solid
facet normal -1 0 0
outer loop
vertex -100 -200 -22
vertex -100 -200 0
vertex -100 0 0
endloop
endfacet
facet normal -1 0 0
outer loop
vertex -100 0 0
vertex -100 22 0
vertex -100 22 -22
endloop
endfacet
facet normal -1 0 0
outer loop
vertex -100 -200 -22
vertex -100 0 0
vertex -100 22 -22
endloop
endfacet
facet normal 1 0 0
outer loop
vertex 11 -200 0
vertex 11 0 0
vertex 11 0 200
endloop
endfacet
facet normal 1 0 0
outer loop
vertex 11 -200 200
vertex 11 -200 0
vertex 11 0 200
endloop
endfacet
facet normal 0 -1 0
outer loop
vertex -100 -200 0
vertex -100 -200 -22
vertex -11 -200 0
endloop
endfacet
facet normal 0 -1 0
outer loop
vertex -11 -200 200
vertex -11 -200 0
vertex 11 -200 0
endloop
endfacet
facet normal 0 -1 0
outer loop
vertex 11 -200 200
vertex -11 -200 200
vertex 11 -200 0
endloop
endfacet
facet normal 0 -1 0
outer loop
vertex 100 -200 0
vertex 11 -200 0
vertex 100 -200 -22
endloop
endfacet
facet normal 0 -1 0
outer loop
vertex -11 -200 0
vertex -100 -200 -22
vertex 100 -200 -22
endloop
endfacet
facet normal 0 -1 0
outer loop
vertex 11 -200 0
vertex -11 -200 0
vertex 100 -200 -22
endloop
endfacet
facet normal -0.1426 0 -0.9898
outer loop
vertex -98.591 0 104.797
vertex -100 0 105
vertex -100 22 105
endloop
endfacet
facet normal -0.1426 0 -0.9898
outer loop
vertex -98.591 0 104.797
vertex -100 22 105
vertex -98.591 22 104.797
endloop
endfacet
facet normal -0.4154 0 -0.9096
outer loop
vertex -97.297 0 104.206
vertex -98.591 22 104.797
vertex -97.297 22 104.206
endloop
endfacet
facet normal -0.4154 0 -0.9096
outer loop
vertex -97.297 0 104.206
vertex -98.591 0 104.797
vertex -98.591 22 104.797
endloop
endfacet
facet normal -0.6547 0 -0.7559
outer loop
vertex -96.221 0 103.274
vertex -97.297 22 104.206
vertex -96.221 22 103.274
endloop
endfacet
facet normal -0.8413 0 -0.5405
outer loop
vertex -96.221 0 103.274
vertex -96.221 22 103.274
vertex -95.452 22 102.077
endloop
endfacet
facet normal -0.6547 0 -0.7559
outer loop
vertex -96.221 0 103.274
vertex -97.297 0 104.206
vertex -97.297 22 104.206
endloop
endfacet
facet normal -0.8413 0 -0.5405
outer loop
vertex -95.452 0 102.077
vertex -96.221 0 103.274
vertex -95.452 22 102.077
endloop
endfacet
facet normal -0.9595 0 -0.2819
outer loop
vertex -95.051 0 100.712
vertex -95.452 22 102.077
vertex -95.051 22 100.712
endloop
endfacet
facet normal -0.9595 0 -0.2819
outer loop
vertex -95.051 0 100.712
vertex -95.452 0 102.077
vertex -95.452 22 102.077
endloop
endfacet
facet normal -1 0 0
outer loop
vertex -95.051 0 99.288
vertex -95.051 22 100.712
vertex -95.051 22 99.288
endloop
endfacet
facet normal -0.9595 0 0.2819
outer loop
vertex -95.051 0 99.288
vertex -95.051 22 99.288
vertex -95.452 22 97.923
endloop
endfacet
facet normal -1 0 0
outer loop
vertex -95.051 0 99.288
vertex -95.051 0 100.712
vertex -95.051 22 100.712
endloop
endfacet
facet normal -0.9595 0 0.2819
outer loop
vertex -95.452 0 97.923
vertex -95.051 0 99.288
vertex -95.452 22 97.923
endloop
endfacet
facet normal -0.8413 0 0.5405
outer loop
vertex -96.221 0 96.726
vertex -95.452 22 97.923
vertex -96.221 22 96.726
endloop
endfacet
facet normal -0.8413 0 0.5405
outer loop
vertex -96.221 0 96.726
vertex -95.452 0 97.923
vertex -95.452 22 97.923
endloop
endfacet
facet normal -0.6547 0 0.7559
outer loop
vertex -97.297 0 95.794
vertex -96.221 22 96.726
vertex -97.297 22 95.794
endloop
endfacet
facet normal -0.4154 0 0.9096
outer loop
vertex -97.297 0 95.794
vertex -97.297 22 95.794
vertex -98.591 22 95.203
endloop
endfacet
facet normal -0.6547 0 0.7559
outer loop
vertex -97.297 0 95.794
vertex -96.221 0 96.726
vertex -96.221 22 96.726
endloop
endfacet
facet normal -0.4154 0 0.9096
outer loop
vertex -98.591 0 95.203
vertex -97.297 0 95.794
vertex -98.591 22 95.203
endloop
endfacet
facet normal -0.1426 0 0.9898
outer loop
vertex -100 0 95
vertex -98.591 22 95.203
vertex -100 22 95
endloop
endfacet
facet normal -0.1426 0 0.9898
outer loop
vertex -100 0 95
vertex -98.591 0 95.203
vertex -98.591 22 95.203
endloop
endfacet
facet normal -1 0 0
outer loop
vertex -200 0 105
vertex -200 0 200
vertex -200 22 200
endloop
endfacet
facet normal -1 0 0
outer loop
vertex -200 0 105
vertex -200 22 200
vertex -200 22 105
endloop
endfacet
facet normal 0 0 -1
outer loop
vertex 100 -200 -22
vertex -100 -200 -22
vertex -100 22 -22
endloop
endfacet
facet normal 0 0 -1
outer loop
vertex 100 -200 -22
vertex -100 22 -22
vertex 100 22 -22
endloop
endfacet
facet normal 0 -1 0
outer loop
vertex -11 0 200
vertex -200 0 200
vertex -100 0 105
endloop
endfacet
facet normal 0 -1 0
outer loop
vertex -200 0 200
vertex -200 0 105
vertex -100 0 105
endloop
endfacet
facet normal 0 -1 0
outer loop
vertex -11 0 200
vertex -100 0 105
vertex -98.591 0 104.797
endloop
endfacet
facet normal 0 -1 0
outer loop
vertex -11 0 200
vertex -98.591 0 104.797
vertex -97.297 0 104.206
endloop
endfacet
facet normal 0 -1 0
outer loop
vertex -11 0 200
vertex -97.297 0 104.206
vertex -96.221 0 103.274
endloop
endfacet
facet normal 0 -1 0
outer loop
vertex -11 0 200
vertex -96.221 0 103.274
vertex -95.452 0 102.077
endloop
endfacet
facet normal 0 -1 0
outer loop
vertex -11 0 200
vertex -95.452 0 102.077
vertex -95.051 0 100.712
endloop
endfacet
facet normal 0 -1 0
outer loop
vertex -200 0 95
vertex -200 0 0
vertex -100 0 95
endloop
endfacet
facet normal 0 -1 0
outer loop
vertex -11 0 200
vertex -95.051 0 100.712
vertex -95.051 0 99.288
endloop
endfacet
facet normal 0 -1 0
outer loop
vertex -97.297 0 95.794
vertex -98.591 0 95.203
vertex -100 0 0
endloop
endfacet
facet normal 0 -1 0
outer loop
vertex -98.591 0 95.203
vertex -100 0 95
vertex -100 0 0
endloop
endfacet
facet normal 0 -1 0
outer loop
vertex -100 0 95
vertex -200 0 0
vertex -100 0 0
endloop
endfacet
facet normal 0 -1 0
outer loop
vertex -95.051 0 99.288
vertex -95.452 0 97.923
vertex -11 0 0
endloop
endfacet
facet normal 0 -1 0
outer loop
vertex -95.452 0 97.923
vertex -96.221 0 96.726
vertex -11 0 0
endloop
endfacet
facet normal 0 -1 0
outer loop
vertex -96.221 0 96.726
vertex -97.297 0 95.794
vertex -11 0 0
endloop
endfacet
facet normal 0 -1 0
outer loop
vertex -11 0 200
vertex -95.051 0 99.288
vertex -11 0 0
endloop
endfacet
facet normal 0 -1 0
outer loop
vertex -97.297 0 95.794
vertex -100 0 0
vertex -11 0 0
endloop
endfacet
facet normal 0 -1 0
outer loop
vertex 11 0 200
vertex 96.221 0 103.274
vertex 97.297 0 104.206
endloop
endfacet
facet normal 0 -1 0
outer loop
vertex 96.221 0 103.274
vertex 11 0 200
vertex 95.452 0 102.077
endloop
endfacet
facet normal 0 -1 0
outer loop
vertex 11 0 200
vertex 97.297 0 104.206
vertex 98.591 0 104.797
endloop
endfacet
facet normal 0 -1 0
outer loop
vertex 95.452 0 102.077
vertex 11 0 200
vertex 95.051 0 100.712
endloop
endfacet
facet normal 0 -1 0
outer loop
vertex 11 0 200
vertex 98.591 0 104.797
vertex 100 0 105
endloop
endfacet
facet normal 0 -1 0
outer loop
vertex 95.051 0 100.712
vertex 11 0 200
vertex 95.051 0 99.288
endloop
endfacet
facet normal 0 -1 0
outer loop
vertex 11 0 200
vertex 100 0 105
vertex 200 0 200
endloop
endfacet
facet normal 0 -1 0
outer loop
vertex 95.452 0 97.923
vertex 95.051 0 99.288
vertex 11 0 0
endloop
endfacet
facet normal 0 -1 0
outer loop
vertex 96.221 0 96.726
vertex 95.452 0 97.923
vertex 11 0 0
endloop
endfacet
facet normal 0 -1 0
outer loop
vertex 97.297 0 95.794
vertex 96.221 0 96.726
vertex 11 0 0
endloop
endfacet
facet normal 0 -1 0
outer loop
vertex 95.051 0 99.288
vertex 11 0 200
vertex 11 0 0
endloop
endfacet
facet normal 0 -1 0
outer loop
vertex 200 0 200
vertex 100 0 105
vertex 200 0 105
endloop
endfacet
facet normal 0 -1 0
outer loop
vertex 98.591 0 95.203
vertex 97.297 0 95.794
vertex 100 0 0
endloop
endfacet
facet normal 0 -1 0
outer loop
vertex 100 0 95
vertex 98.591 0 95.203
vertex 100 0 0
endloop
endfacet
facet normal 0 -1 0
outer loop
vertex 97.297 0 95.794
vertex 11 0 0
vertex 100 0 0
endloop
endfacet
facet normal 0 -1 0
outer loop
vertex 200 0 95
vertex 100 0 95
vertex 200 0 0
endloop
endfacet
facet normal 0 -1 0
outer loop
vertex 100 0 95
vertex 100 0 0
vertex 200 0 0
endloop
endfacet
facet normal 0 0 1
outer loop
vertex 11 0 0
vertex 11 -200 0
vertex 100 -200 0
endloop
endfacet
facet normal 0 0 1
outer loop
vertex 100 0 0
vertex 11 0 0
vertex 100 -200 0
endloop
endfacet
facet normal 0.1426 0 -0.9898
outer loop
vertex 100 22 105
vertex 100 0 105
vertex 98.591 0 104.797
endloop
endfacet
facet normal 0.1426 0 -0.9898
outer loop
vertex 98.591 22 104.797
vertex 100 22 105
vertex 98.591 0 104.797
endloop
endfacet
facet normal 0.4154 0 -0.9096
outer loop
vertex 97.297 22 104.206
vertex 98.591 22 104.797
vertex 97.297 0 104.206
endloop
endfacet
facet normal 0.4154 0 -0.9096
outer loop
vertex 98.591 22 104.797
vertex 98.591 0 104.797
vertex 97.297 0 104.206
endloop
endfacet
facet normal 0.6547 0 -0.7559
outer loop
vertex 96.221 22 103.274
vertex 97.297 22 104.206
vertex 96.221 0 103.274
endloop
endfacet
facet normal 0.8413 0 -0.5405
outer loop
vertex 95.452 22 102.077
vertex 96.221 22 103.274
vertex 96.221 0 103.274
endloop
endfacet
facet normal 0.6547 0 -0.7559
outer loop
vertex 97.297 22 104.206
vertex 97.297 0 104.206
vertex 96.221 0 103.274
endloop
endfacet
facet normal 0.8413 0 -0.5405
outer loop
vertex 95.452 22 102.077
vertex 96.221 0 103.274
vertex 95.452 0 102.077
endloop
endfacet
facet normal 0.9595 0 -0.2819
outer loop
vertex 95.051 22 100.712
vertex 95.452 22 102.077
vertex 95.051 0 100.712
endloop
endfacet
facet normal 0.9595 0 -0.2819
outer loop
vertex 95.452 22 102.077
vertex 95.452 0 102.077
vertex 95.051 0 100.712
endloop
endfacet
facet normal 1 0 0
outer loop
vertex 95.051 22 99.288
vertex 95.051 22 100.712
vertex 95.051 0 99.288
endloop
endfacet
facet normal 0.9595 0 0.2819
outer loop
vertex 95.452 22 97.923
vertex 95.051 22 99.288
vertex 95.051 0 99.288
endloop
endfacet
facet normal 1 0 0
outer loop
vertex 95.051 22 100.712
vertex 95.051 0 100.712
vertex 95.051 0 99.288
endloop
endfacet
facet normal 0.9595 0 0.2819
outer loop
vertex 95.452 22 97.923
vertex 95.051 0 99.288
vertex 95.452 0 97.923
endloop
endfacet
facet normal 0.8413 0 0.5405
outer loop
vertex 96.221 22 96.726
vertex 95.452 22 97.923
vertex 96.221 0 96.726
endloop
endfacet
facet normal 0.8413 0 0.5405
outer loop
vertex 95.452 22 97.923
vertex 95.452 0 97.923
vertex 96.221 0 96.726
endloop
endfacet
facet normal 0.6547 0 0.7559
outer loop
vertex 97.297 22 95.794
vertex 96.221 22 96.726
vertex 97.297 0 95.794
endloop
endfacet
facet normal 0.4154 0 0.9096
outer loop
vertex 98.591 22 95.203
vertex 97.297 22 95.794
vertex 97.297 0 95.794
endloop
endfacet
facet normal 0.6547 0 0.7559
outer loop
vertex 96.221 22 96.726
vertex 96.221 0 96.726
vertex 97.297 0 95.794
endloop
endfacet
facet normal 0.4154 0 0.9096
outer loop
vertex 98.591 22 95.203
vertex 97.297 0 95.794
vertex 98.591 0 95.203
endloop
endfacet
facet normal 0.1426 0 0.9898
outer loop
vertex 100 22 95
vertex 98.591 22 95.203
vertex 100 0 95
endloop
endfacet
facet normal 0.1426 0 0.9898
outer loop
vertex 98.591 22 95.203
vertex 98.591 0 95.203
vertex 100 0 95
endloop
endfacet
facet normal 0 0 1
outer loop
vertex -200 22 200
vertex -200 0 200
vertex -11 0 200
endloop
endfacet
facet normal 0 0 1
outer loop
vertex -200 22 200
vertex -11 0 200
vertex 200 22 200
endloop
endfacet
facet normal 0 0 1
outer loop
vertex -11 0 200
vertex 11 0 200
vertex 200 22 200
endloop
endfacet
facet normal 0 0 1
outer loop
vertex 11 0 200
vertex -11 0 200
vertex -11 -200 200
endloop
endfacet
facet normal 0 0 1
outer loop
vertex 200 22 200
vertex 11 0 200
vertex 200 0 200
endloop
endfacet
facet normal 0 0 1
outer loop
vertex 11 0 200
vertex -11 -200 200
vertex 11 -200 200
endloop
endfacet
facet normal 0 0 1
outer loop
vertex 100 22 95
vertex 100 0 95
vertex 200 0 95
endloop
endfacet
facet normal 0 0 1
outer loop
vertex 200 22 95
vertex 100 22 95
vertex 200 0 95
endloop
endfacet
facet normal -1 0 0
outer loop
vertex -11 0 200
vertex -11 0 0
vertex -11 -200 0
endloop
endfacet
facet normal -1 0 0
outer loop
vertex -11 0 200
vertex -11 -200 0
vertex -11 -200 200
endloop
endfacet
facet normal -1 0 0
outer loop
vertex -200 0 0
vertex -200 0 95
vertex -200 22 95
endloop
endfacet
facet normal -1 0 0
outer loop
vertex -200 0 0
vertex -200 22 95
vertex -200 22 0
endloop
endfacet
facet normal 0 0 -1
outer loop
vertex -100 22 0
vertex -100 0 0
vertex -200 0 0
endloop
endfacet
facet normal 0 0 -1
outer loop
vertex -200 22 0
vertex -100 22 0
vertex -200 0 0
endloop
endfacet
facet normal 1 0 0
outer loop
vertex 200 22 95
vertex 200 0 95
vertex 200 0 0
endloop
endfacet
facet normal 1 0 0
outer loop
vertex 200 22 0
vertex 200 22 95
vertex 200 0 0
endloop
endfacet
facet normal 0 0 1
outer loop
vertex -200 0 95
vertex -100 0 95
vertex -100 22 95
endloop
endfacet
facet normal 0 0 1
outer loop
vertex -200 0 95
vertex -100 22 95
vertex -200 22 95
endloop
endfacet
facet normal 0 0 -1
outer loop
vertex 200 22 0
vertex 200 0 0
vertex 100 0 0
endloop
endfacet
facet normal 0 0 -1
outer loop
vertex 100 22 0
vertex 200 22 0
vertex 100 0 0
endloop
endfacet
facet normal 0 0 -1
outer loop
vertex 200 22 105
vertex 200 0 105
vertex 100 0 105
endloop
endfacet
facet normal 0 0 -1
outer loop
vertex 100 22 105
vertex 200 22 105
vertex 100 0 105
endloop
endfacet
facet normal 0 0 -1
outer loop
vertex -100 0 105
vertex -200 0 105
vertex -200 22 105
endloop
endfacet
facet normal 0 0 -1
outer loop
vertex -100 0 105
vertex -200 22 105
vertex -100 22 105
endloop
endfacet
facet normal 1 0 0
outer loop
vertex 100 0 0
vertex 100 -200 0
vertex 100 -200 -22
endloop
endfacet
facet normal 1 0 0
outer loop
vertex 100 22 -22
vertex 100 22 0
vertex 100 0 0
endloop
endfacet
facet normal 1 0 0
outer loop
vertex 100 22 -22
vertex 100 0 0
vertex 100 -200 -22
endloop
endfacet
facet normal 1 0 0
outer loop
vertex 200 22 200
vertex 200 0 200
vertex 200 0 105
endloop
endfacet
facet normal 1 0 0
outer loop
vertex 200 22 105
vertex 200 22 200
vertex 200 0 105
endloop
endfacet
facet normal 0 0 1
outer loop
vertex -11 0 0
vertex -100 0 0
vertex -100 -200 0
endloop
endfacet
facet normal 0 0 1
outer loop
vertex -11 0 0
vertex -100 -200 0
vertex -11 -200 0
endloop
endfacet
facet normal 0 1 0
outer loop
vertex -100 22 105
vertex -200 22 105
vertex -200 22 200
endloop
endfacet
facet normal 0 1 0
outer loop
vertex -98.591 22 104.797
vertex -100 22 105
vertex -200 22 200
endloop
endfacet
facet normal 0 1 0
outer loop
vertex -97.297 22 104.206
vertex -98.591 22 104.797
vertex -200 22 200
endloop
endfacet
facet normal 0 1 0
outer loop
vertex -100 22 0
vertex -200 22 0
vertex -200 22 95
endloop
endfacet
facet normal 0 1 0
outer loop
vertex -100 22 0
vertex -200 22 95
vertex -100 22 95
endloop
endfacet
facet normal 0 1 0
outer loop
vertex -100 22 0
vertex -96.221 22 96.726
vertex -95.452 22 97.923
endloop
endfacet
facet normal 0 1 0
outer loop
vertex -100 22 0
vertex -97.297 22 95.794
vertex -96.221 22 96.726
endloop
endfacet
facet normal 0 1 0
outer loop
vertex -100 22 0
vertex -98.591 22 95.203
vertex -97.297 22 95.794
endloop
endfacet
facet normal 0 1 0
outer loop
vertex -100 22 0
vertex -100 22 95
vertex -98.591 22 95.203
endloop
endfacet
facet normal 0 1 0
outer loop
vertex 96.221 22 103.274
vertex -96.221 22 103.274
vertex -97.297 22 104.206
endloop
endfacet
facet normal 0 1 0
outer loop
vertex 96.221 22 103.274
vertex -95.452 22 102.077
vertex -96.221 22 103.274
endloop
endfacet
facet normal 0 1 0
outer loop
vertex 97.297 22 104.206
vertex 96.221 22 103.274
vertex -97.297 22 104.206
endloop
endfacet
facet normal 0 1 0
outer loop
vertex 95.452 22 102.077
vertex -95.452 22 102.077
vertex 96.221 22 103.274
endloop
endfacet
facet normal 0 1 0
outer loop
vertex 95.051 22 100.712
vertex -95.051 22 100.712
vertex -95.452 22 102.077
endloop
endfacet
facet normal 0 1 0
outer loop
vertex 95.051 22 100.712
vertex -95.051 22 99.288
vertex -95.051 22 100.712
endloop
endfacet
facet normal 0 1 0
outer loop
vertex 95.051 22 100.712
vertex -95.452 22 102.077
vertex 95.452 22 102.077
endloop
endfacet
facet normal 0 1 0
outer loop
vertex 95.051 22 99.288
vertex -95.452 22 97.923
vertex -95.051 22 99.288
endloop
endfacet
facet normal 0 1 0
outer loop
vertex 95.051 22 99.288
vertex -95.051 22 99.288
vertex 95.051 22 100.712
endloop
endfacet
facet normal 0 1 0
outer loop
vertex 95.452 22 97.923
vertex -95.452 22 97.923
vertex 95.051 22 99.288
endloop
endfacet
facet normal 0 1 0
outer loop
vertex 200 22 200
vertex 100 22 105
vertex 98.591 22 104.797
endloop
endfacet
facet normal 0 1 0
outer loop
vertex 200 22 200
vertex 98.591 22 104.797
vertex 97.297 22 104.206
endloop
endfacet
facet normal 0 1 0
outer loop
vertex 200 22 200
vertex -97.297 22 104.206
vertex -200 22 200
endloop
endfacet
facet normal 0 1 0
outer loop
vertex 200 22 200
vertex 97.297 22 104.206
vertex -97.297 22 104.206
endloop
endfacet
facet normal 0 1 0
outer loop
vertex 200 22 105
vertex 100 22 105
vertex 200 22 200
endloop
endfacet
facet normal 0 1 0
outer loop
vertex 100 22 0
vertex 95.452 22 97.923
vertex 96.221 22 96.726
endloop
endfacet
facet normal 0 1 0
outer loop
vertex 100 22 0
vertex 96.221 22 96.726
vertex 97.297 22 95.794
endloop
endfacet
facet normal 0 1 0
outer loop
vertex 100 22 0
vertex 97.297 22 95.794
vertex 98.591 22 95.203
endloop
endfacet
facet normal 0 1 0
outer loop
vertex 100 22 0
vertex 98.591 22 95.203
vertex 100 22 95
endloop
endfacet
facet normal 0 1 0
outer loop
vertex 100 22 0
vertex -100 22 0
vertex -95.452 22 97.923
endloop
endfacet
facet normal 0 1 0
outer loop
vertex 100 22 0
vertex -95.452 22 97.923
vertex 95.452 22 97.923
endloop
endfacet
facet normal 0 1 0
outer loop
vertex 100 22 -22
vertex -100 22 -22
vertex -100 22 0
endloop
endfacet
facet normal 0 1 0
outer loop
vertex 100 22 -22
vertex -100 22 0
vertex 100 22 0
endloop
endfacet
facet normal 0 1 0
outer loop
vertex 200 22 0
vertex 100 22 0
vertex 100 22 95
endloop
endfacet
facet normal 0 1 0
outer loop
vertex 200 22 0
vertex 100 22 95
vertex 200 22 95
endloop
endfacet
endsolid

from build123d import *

# Parameters (mm, degrees)
BOSS_EXTRU_1_DEPTH = 22
ESQUISSE2_W        = 22
ESQUISSE2_H        = 200
BOSS_EXTRU_2_DEPTH = 200
ESQUISSE3_W        = 200
ESQUISSE3_H        = 22
BOSS_EXTRU_3_DEPTH = 222


with BuildPart() as part:
    # Esquisse1 → Boss.-Extru.1 (new body)
    with BuildSketch(Plane(origin=(0, 0, 0), x_dir=(1, 0, 0), z_dir=(0, 1, 0))):
        with BuildLine():
            Line((0, 0), (0, -200))
            Line((0, -200), (-200, -200))
            Line((-200, -200), (-200, -105))
            Line((-200, -105), (-100, -105))
            ThreePointArc((-100, -105), (-95, -100), (-100, -95))
            Line((-100, -95), (-200, -95))
            Line((-200, -95), (-200, 0))
            Line((-200, 0), (0, 0))
        make_face()
    boss_extru_1 = extrude(amount=BOSS_EXTRU_1_DEPTH)

    # Symétrie1: Boss.-Extru.1 across plane
    add(boss_extru_1.mirror(Plane(origin=(0, 22, 0), x_dir=(0, 0, 1), z_dir=(-1, 0, 0))))

    # Esquisse2 → Boss.-Extru.2 (add)
    with BuildSketch(Plane.XZ):
        with Locations((0, 100)):
            Rectangle(ESQUISSE2_W, ESQUISSE2_H)
    extrude(amount=BOSS_EXTRU_2_DEPTH)

    # Esquisse3 → Boss.-Extru.3 (add)
    with BuildSketch(Plane(origin=(0, 22, 0), x_dir=(1, 0, 0), z_dir=(0, 1, 0))):
        with Locations((0, 11)):
            Rectangle(ESQUISSE3_W, ESQUISSE3_H)
    extrude(amount=-BOSS_EXTRU_3_DEPTH)


solid = part.part
